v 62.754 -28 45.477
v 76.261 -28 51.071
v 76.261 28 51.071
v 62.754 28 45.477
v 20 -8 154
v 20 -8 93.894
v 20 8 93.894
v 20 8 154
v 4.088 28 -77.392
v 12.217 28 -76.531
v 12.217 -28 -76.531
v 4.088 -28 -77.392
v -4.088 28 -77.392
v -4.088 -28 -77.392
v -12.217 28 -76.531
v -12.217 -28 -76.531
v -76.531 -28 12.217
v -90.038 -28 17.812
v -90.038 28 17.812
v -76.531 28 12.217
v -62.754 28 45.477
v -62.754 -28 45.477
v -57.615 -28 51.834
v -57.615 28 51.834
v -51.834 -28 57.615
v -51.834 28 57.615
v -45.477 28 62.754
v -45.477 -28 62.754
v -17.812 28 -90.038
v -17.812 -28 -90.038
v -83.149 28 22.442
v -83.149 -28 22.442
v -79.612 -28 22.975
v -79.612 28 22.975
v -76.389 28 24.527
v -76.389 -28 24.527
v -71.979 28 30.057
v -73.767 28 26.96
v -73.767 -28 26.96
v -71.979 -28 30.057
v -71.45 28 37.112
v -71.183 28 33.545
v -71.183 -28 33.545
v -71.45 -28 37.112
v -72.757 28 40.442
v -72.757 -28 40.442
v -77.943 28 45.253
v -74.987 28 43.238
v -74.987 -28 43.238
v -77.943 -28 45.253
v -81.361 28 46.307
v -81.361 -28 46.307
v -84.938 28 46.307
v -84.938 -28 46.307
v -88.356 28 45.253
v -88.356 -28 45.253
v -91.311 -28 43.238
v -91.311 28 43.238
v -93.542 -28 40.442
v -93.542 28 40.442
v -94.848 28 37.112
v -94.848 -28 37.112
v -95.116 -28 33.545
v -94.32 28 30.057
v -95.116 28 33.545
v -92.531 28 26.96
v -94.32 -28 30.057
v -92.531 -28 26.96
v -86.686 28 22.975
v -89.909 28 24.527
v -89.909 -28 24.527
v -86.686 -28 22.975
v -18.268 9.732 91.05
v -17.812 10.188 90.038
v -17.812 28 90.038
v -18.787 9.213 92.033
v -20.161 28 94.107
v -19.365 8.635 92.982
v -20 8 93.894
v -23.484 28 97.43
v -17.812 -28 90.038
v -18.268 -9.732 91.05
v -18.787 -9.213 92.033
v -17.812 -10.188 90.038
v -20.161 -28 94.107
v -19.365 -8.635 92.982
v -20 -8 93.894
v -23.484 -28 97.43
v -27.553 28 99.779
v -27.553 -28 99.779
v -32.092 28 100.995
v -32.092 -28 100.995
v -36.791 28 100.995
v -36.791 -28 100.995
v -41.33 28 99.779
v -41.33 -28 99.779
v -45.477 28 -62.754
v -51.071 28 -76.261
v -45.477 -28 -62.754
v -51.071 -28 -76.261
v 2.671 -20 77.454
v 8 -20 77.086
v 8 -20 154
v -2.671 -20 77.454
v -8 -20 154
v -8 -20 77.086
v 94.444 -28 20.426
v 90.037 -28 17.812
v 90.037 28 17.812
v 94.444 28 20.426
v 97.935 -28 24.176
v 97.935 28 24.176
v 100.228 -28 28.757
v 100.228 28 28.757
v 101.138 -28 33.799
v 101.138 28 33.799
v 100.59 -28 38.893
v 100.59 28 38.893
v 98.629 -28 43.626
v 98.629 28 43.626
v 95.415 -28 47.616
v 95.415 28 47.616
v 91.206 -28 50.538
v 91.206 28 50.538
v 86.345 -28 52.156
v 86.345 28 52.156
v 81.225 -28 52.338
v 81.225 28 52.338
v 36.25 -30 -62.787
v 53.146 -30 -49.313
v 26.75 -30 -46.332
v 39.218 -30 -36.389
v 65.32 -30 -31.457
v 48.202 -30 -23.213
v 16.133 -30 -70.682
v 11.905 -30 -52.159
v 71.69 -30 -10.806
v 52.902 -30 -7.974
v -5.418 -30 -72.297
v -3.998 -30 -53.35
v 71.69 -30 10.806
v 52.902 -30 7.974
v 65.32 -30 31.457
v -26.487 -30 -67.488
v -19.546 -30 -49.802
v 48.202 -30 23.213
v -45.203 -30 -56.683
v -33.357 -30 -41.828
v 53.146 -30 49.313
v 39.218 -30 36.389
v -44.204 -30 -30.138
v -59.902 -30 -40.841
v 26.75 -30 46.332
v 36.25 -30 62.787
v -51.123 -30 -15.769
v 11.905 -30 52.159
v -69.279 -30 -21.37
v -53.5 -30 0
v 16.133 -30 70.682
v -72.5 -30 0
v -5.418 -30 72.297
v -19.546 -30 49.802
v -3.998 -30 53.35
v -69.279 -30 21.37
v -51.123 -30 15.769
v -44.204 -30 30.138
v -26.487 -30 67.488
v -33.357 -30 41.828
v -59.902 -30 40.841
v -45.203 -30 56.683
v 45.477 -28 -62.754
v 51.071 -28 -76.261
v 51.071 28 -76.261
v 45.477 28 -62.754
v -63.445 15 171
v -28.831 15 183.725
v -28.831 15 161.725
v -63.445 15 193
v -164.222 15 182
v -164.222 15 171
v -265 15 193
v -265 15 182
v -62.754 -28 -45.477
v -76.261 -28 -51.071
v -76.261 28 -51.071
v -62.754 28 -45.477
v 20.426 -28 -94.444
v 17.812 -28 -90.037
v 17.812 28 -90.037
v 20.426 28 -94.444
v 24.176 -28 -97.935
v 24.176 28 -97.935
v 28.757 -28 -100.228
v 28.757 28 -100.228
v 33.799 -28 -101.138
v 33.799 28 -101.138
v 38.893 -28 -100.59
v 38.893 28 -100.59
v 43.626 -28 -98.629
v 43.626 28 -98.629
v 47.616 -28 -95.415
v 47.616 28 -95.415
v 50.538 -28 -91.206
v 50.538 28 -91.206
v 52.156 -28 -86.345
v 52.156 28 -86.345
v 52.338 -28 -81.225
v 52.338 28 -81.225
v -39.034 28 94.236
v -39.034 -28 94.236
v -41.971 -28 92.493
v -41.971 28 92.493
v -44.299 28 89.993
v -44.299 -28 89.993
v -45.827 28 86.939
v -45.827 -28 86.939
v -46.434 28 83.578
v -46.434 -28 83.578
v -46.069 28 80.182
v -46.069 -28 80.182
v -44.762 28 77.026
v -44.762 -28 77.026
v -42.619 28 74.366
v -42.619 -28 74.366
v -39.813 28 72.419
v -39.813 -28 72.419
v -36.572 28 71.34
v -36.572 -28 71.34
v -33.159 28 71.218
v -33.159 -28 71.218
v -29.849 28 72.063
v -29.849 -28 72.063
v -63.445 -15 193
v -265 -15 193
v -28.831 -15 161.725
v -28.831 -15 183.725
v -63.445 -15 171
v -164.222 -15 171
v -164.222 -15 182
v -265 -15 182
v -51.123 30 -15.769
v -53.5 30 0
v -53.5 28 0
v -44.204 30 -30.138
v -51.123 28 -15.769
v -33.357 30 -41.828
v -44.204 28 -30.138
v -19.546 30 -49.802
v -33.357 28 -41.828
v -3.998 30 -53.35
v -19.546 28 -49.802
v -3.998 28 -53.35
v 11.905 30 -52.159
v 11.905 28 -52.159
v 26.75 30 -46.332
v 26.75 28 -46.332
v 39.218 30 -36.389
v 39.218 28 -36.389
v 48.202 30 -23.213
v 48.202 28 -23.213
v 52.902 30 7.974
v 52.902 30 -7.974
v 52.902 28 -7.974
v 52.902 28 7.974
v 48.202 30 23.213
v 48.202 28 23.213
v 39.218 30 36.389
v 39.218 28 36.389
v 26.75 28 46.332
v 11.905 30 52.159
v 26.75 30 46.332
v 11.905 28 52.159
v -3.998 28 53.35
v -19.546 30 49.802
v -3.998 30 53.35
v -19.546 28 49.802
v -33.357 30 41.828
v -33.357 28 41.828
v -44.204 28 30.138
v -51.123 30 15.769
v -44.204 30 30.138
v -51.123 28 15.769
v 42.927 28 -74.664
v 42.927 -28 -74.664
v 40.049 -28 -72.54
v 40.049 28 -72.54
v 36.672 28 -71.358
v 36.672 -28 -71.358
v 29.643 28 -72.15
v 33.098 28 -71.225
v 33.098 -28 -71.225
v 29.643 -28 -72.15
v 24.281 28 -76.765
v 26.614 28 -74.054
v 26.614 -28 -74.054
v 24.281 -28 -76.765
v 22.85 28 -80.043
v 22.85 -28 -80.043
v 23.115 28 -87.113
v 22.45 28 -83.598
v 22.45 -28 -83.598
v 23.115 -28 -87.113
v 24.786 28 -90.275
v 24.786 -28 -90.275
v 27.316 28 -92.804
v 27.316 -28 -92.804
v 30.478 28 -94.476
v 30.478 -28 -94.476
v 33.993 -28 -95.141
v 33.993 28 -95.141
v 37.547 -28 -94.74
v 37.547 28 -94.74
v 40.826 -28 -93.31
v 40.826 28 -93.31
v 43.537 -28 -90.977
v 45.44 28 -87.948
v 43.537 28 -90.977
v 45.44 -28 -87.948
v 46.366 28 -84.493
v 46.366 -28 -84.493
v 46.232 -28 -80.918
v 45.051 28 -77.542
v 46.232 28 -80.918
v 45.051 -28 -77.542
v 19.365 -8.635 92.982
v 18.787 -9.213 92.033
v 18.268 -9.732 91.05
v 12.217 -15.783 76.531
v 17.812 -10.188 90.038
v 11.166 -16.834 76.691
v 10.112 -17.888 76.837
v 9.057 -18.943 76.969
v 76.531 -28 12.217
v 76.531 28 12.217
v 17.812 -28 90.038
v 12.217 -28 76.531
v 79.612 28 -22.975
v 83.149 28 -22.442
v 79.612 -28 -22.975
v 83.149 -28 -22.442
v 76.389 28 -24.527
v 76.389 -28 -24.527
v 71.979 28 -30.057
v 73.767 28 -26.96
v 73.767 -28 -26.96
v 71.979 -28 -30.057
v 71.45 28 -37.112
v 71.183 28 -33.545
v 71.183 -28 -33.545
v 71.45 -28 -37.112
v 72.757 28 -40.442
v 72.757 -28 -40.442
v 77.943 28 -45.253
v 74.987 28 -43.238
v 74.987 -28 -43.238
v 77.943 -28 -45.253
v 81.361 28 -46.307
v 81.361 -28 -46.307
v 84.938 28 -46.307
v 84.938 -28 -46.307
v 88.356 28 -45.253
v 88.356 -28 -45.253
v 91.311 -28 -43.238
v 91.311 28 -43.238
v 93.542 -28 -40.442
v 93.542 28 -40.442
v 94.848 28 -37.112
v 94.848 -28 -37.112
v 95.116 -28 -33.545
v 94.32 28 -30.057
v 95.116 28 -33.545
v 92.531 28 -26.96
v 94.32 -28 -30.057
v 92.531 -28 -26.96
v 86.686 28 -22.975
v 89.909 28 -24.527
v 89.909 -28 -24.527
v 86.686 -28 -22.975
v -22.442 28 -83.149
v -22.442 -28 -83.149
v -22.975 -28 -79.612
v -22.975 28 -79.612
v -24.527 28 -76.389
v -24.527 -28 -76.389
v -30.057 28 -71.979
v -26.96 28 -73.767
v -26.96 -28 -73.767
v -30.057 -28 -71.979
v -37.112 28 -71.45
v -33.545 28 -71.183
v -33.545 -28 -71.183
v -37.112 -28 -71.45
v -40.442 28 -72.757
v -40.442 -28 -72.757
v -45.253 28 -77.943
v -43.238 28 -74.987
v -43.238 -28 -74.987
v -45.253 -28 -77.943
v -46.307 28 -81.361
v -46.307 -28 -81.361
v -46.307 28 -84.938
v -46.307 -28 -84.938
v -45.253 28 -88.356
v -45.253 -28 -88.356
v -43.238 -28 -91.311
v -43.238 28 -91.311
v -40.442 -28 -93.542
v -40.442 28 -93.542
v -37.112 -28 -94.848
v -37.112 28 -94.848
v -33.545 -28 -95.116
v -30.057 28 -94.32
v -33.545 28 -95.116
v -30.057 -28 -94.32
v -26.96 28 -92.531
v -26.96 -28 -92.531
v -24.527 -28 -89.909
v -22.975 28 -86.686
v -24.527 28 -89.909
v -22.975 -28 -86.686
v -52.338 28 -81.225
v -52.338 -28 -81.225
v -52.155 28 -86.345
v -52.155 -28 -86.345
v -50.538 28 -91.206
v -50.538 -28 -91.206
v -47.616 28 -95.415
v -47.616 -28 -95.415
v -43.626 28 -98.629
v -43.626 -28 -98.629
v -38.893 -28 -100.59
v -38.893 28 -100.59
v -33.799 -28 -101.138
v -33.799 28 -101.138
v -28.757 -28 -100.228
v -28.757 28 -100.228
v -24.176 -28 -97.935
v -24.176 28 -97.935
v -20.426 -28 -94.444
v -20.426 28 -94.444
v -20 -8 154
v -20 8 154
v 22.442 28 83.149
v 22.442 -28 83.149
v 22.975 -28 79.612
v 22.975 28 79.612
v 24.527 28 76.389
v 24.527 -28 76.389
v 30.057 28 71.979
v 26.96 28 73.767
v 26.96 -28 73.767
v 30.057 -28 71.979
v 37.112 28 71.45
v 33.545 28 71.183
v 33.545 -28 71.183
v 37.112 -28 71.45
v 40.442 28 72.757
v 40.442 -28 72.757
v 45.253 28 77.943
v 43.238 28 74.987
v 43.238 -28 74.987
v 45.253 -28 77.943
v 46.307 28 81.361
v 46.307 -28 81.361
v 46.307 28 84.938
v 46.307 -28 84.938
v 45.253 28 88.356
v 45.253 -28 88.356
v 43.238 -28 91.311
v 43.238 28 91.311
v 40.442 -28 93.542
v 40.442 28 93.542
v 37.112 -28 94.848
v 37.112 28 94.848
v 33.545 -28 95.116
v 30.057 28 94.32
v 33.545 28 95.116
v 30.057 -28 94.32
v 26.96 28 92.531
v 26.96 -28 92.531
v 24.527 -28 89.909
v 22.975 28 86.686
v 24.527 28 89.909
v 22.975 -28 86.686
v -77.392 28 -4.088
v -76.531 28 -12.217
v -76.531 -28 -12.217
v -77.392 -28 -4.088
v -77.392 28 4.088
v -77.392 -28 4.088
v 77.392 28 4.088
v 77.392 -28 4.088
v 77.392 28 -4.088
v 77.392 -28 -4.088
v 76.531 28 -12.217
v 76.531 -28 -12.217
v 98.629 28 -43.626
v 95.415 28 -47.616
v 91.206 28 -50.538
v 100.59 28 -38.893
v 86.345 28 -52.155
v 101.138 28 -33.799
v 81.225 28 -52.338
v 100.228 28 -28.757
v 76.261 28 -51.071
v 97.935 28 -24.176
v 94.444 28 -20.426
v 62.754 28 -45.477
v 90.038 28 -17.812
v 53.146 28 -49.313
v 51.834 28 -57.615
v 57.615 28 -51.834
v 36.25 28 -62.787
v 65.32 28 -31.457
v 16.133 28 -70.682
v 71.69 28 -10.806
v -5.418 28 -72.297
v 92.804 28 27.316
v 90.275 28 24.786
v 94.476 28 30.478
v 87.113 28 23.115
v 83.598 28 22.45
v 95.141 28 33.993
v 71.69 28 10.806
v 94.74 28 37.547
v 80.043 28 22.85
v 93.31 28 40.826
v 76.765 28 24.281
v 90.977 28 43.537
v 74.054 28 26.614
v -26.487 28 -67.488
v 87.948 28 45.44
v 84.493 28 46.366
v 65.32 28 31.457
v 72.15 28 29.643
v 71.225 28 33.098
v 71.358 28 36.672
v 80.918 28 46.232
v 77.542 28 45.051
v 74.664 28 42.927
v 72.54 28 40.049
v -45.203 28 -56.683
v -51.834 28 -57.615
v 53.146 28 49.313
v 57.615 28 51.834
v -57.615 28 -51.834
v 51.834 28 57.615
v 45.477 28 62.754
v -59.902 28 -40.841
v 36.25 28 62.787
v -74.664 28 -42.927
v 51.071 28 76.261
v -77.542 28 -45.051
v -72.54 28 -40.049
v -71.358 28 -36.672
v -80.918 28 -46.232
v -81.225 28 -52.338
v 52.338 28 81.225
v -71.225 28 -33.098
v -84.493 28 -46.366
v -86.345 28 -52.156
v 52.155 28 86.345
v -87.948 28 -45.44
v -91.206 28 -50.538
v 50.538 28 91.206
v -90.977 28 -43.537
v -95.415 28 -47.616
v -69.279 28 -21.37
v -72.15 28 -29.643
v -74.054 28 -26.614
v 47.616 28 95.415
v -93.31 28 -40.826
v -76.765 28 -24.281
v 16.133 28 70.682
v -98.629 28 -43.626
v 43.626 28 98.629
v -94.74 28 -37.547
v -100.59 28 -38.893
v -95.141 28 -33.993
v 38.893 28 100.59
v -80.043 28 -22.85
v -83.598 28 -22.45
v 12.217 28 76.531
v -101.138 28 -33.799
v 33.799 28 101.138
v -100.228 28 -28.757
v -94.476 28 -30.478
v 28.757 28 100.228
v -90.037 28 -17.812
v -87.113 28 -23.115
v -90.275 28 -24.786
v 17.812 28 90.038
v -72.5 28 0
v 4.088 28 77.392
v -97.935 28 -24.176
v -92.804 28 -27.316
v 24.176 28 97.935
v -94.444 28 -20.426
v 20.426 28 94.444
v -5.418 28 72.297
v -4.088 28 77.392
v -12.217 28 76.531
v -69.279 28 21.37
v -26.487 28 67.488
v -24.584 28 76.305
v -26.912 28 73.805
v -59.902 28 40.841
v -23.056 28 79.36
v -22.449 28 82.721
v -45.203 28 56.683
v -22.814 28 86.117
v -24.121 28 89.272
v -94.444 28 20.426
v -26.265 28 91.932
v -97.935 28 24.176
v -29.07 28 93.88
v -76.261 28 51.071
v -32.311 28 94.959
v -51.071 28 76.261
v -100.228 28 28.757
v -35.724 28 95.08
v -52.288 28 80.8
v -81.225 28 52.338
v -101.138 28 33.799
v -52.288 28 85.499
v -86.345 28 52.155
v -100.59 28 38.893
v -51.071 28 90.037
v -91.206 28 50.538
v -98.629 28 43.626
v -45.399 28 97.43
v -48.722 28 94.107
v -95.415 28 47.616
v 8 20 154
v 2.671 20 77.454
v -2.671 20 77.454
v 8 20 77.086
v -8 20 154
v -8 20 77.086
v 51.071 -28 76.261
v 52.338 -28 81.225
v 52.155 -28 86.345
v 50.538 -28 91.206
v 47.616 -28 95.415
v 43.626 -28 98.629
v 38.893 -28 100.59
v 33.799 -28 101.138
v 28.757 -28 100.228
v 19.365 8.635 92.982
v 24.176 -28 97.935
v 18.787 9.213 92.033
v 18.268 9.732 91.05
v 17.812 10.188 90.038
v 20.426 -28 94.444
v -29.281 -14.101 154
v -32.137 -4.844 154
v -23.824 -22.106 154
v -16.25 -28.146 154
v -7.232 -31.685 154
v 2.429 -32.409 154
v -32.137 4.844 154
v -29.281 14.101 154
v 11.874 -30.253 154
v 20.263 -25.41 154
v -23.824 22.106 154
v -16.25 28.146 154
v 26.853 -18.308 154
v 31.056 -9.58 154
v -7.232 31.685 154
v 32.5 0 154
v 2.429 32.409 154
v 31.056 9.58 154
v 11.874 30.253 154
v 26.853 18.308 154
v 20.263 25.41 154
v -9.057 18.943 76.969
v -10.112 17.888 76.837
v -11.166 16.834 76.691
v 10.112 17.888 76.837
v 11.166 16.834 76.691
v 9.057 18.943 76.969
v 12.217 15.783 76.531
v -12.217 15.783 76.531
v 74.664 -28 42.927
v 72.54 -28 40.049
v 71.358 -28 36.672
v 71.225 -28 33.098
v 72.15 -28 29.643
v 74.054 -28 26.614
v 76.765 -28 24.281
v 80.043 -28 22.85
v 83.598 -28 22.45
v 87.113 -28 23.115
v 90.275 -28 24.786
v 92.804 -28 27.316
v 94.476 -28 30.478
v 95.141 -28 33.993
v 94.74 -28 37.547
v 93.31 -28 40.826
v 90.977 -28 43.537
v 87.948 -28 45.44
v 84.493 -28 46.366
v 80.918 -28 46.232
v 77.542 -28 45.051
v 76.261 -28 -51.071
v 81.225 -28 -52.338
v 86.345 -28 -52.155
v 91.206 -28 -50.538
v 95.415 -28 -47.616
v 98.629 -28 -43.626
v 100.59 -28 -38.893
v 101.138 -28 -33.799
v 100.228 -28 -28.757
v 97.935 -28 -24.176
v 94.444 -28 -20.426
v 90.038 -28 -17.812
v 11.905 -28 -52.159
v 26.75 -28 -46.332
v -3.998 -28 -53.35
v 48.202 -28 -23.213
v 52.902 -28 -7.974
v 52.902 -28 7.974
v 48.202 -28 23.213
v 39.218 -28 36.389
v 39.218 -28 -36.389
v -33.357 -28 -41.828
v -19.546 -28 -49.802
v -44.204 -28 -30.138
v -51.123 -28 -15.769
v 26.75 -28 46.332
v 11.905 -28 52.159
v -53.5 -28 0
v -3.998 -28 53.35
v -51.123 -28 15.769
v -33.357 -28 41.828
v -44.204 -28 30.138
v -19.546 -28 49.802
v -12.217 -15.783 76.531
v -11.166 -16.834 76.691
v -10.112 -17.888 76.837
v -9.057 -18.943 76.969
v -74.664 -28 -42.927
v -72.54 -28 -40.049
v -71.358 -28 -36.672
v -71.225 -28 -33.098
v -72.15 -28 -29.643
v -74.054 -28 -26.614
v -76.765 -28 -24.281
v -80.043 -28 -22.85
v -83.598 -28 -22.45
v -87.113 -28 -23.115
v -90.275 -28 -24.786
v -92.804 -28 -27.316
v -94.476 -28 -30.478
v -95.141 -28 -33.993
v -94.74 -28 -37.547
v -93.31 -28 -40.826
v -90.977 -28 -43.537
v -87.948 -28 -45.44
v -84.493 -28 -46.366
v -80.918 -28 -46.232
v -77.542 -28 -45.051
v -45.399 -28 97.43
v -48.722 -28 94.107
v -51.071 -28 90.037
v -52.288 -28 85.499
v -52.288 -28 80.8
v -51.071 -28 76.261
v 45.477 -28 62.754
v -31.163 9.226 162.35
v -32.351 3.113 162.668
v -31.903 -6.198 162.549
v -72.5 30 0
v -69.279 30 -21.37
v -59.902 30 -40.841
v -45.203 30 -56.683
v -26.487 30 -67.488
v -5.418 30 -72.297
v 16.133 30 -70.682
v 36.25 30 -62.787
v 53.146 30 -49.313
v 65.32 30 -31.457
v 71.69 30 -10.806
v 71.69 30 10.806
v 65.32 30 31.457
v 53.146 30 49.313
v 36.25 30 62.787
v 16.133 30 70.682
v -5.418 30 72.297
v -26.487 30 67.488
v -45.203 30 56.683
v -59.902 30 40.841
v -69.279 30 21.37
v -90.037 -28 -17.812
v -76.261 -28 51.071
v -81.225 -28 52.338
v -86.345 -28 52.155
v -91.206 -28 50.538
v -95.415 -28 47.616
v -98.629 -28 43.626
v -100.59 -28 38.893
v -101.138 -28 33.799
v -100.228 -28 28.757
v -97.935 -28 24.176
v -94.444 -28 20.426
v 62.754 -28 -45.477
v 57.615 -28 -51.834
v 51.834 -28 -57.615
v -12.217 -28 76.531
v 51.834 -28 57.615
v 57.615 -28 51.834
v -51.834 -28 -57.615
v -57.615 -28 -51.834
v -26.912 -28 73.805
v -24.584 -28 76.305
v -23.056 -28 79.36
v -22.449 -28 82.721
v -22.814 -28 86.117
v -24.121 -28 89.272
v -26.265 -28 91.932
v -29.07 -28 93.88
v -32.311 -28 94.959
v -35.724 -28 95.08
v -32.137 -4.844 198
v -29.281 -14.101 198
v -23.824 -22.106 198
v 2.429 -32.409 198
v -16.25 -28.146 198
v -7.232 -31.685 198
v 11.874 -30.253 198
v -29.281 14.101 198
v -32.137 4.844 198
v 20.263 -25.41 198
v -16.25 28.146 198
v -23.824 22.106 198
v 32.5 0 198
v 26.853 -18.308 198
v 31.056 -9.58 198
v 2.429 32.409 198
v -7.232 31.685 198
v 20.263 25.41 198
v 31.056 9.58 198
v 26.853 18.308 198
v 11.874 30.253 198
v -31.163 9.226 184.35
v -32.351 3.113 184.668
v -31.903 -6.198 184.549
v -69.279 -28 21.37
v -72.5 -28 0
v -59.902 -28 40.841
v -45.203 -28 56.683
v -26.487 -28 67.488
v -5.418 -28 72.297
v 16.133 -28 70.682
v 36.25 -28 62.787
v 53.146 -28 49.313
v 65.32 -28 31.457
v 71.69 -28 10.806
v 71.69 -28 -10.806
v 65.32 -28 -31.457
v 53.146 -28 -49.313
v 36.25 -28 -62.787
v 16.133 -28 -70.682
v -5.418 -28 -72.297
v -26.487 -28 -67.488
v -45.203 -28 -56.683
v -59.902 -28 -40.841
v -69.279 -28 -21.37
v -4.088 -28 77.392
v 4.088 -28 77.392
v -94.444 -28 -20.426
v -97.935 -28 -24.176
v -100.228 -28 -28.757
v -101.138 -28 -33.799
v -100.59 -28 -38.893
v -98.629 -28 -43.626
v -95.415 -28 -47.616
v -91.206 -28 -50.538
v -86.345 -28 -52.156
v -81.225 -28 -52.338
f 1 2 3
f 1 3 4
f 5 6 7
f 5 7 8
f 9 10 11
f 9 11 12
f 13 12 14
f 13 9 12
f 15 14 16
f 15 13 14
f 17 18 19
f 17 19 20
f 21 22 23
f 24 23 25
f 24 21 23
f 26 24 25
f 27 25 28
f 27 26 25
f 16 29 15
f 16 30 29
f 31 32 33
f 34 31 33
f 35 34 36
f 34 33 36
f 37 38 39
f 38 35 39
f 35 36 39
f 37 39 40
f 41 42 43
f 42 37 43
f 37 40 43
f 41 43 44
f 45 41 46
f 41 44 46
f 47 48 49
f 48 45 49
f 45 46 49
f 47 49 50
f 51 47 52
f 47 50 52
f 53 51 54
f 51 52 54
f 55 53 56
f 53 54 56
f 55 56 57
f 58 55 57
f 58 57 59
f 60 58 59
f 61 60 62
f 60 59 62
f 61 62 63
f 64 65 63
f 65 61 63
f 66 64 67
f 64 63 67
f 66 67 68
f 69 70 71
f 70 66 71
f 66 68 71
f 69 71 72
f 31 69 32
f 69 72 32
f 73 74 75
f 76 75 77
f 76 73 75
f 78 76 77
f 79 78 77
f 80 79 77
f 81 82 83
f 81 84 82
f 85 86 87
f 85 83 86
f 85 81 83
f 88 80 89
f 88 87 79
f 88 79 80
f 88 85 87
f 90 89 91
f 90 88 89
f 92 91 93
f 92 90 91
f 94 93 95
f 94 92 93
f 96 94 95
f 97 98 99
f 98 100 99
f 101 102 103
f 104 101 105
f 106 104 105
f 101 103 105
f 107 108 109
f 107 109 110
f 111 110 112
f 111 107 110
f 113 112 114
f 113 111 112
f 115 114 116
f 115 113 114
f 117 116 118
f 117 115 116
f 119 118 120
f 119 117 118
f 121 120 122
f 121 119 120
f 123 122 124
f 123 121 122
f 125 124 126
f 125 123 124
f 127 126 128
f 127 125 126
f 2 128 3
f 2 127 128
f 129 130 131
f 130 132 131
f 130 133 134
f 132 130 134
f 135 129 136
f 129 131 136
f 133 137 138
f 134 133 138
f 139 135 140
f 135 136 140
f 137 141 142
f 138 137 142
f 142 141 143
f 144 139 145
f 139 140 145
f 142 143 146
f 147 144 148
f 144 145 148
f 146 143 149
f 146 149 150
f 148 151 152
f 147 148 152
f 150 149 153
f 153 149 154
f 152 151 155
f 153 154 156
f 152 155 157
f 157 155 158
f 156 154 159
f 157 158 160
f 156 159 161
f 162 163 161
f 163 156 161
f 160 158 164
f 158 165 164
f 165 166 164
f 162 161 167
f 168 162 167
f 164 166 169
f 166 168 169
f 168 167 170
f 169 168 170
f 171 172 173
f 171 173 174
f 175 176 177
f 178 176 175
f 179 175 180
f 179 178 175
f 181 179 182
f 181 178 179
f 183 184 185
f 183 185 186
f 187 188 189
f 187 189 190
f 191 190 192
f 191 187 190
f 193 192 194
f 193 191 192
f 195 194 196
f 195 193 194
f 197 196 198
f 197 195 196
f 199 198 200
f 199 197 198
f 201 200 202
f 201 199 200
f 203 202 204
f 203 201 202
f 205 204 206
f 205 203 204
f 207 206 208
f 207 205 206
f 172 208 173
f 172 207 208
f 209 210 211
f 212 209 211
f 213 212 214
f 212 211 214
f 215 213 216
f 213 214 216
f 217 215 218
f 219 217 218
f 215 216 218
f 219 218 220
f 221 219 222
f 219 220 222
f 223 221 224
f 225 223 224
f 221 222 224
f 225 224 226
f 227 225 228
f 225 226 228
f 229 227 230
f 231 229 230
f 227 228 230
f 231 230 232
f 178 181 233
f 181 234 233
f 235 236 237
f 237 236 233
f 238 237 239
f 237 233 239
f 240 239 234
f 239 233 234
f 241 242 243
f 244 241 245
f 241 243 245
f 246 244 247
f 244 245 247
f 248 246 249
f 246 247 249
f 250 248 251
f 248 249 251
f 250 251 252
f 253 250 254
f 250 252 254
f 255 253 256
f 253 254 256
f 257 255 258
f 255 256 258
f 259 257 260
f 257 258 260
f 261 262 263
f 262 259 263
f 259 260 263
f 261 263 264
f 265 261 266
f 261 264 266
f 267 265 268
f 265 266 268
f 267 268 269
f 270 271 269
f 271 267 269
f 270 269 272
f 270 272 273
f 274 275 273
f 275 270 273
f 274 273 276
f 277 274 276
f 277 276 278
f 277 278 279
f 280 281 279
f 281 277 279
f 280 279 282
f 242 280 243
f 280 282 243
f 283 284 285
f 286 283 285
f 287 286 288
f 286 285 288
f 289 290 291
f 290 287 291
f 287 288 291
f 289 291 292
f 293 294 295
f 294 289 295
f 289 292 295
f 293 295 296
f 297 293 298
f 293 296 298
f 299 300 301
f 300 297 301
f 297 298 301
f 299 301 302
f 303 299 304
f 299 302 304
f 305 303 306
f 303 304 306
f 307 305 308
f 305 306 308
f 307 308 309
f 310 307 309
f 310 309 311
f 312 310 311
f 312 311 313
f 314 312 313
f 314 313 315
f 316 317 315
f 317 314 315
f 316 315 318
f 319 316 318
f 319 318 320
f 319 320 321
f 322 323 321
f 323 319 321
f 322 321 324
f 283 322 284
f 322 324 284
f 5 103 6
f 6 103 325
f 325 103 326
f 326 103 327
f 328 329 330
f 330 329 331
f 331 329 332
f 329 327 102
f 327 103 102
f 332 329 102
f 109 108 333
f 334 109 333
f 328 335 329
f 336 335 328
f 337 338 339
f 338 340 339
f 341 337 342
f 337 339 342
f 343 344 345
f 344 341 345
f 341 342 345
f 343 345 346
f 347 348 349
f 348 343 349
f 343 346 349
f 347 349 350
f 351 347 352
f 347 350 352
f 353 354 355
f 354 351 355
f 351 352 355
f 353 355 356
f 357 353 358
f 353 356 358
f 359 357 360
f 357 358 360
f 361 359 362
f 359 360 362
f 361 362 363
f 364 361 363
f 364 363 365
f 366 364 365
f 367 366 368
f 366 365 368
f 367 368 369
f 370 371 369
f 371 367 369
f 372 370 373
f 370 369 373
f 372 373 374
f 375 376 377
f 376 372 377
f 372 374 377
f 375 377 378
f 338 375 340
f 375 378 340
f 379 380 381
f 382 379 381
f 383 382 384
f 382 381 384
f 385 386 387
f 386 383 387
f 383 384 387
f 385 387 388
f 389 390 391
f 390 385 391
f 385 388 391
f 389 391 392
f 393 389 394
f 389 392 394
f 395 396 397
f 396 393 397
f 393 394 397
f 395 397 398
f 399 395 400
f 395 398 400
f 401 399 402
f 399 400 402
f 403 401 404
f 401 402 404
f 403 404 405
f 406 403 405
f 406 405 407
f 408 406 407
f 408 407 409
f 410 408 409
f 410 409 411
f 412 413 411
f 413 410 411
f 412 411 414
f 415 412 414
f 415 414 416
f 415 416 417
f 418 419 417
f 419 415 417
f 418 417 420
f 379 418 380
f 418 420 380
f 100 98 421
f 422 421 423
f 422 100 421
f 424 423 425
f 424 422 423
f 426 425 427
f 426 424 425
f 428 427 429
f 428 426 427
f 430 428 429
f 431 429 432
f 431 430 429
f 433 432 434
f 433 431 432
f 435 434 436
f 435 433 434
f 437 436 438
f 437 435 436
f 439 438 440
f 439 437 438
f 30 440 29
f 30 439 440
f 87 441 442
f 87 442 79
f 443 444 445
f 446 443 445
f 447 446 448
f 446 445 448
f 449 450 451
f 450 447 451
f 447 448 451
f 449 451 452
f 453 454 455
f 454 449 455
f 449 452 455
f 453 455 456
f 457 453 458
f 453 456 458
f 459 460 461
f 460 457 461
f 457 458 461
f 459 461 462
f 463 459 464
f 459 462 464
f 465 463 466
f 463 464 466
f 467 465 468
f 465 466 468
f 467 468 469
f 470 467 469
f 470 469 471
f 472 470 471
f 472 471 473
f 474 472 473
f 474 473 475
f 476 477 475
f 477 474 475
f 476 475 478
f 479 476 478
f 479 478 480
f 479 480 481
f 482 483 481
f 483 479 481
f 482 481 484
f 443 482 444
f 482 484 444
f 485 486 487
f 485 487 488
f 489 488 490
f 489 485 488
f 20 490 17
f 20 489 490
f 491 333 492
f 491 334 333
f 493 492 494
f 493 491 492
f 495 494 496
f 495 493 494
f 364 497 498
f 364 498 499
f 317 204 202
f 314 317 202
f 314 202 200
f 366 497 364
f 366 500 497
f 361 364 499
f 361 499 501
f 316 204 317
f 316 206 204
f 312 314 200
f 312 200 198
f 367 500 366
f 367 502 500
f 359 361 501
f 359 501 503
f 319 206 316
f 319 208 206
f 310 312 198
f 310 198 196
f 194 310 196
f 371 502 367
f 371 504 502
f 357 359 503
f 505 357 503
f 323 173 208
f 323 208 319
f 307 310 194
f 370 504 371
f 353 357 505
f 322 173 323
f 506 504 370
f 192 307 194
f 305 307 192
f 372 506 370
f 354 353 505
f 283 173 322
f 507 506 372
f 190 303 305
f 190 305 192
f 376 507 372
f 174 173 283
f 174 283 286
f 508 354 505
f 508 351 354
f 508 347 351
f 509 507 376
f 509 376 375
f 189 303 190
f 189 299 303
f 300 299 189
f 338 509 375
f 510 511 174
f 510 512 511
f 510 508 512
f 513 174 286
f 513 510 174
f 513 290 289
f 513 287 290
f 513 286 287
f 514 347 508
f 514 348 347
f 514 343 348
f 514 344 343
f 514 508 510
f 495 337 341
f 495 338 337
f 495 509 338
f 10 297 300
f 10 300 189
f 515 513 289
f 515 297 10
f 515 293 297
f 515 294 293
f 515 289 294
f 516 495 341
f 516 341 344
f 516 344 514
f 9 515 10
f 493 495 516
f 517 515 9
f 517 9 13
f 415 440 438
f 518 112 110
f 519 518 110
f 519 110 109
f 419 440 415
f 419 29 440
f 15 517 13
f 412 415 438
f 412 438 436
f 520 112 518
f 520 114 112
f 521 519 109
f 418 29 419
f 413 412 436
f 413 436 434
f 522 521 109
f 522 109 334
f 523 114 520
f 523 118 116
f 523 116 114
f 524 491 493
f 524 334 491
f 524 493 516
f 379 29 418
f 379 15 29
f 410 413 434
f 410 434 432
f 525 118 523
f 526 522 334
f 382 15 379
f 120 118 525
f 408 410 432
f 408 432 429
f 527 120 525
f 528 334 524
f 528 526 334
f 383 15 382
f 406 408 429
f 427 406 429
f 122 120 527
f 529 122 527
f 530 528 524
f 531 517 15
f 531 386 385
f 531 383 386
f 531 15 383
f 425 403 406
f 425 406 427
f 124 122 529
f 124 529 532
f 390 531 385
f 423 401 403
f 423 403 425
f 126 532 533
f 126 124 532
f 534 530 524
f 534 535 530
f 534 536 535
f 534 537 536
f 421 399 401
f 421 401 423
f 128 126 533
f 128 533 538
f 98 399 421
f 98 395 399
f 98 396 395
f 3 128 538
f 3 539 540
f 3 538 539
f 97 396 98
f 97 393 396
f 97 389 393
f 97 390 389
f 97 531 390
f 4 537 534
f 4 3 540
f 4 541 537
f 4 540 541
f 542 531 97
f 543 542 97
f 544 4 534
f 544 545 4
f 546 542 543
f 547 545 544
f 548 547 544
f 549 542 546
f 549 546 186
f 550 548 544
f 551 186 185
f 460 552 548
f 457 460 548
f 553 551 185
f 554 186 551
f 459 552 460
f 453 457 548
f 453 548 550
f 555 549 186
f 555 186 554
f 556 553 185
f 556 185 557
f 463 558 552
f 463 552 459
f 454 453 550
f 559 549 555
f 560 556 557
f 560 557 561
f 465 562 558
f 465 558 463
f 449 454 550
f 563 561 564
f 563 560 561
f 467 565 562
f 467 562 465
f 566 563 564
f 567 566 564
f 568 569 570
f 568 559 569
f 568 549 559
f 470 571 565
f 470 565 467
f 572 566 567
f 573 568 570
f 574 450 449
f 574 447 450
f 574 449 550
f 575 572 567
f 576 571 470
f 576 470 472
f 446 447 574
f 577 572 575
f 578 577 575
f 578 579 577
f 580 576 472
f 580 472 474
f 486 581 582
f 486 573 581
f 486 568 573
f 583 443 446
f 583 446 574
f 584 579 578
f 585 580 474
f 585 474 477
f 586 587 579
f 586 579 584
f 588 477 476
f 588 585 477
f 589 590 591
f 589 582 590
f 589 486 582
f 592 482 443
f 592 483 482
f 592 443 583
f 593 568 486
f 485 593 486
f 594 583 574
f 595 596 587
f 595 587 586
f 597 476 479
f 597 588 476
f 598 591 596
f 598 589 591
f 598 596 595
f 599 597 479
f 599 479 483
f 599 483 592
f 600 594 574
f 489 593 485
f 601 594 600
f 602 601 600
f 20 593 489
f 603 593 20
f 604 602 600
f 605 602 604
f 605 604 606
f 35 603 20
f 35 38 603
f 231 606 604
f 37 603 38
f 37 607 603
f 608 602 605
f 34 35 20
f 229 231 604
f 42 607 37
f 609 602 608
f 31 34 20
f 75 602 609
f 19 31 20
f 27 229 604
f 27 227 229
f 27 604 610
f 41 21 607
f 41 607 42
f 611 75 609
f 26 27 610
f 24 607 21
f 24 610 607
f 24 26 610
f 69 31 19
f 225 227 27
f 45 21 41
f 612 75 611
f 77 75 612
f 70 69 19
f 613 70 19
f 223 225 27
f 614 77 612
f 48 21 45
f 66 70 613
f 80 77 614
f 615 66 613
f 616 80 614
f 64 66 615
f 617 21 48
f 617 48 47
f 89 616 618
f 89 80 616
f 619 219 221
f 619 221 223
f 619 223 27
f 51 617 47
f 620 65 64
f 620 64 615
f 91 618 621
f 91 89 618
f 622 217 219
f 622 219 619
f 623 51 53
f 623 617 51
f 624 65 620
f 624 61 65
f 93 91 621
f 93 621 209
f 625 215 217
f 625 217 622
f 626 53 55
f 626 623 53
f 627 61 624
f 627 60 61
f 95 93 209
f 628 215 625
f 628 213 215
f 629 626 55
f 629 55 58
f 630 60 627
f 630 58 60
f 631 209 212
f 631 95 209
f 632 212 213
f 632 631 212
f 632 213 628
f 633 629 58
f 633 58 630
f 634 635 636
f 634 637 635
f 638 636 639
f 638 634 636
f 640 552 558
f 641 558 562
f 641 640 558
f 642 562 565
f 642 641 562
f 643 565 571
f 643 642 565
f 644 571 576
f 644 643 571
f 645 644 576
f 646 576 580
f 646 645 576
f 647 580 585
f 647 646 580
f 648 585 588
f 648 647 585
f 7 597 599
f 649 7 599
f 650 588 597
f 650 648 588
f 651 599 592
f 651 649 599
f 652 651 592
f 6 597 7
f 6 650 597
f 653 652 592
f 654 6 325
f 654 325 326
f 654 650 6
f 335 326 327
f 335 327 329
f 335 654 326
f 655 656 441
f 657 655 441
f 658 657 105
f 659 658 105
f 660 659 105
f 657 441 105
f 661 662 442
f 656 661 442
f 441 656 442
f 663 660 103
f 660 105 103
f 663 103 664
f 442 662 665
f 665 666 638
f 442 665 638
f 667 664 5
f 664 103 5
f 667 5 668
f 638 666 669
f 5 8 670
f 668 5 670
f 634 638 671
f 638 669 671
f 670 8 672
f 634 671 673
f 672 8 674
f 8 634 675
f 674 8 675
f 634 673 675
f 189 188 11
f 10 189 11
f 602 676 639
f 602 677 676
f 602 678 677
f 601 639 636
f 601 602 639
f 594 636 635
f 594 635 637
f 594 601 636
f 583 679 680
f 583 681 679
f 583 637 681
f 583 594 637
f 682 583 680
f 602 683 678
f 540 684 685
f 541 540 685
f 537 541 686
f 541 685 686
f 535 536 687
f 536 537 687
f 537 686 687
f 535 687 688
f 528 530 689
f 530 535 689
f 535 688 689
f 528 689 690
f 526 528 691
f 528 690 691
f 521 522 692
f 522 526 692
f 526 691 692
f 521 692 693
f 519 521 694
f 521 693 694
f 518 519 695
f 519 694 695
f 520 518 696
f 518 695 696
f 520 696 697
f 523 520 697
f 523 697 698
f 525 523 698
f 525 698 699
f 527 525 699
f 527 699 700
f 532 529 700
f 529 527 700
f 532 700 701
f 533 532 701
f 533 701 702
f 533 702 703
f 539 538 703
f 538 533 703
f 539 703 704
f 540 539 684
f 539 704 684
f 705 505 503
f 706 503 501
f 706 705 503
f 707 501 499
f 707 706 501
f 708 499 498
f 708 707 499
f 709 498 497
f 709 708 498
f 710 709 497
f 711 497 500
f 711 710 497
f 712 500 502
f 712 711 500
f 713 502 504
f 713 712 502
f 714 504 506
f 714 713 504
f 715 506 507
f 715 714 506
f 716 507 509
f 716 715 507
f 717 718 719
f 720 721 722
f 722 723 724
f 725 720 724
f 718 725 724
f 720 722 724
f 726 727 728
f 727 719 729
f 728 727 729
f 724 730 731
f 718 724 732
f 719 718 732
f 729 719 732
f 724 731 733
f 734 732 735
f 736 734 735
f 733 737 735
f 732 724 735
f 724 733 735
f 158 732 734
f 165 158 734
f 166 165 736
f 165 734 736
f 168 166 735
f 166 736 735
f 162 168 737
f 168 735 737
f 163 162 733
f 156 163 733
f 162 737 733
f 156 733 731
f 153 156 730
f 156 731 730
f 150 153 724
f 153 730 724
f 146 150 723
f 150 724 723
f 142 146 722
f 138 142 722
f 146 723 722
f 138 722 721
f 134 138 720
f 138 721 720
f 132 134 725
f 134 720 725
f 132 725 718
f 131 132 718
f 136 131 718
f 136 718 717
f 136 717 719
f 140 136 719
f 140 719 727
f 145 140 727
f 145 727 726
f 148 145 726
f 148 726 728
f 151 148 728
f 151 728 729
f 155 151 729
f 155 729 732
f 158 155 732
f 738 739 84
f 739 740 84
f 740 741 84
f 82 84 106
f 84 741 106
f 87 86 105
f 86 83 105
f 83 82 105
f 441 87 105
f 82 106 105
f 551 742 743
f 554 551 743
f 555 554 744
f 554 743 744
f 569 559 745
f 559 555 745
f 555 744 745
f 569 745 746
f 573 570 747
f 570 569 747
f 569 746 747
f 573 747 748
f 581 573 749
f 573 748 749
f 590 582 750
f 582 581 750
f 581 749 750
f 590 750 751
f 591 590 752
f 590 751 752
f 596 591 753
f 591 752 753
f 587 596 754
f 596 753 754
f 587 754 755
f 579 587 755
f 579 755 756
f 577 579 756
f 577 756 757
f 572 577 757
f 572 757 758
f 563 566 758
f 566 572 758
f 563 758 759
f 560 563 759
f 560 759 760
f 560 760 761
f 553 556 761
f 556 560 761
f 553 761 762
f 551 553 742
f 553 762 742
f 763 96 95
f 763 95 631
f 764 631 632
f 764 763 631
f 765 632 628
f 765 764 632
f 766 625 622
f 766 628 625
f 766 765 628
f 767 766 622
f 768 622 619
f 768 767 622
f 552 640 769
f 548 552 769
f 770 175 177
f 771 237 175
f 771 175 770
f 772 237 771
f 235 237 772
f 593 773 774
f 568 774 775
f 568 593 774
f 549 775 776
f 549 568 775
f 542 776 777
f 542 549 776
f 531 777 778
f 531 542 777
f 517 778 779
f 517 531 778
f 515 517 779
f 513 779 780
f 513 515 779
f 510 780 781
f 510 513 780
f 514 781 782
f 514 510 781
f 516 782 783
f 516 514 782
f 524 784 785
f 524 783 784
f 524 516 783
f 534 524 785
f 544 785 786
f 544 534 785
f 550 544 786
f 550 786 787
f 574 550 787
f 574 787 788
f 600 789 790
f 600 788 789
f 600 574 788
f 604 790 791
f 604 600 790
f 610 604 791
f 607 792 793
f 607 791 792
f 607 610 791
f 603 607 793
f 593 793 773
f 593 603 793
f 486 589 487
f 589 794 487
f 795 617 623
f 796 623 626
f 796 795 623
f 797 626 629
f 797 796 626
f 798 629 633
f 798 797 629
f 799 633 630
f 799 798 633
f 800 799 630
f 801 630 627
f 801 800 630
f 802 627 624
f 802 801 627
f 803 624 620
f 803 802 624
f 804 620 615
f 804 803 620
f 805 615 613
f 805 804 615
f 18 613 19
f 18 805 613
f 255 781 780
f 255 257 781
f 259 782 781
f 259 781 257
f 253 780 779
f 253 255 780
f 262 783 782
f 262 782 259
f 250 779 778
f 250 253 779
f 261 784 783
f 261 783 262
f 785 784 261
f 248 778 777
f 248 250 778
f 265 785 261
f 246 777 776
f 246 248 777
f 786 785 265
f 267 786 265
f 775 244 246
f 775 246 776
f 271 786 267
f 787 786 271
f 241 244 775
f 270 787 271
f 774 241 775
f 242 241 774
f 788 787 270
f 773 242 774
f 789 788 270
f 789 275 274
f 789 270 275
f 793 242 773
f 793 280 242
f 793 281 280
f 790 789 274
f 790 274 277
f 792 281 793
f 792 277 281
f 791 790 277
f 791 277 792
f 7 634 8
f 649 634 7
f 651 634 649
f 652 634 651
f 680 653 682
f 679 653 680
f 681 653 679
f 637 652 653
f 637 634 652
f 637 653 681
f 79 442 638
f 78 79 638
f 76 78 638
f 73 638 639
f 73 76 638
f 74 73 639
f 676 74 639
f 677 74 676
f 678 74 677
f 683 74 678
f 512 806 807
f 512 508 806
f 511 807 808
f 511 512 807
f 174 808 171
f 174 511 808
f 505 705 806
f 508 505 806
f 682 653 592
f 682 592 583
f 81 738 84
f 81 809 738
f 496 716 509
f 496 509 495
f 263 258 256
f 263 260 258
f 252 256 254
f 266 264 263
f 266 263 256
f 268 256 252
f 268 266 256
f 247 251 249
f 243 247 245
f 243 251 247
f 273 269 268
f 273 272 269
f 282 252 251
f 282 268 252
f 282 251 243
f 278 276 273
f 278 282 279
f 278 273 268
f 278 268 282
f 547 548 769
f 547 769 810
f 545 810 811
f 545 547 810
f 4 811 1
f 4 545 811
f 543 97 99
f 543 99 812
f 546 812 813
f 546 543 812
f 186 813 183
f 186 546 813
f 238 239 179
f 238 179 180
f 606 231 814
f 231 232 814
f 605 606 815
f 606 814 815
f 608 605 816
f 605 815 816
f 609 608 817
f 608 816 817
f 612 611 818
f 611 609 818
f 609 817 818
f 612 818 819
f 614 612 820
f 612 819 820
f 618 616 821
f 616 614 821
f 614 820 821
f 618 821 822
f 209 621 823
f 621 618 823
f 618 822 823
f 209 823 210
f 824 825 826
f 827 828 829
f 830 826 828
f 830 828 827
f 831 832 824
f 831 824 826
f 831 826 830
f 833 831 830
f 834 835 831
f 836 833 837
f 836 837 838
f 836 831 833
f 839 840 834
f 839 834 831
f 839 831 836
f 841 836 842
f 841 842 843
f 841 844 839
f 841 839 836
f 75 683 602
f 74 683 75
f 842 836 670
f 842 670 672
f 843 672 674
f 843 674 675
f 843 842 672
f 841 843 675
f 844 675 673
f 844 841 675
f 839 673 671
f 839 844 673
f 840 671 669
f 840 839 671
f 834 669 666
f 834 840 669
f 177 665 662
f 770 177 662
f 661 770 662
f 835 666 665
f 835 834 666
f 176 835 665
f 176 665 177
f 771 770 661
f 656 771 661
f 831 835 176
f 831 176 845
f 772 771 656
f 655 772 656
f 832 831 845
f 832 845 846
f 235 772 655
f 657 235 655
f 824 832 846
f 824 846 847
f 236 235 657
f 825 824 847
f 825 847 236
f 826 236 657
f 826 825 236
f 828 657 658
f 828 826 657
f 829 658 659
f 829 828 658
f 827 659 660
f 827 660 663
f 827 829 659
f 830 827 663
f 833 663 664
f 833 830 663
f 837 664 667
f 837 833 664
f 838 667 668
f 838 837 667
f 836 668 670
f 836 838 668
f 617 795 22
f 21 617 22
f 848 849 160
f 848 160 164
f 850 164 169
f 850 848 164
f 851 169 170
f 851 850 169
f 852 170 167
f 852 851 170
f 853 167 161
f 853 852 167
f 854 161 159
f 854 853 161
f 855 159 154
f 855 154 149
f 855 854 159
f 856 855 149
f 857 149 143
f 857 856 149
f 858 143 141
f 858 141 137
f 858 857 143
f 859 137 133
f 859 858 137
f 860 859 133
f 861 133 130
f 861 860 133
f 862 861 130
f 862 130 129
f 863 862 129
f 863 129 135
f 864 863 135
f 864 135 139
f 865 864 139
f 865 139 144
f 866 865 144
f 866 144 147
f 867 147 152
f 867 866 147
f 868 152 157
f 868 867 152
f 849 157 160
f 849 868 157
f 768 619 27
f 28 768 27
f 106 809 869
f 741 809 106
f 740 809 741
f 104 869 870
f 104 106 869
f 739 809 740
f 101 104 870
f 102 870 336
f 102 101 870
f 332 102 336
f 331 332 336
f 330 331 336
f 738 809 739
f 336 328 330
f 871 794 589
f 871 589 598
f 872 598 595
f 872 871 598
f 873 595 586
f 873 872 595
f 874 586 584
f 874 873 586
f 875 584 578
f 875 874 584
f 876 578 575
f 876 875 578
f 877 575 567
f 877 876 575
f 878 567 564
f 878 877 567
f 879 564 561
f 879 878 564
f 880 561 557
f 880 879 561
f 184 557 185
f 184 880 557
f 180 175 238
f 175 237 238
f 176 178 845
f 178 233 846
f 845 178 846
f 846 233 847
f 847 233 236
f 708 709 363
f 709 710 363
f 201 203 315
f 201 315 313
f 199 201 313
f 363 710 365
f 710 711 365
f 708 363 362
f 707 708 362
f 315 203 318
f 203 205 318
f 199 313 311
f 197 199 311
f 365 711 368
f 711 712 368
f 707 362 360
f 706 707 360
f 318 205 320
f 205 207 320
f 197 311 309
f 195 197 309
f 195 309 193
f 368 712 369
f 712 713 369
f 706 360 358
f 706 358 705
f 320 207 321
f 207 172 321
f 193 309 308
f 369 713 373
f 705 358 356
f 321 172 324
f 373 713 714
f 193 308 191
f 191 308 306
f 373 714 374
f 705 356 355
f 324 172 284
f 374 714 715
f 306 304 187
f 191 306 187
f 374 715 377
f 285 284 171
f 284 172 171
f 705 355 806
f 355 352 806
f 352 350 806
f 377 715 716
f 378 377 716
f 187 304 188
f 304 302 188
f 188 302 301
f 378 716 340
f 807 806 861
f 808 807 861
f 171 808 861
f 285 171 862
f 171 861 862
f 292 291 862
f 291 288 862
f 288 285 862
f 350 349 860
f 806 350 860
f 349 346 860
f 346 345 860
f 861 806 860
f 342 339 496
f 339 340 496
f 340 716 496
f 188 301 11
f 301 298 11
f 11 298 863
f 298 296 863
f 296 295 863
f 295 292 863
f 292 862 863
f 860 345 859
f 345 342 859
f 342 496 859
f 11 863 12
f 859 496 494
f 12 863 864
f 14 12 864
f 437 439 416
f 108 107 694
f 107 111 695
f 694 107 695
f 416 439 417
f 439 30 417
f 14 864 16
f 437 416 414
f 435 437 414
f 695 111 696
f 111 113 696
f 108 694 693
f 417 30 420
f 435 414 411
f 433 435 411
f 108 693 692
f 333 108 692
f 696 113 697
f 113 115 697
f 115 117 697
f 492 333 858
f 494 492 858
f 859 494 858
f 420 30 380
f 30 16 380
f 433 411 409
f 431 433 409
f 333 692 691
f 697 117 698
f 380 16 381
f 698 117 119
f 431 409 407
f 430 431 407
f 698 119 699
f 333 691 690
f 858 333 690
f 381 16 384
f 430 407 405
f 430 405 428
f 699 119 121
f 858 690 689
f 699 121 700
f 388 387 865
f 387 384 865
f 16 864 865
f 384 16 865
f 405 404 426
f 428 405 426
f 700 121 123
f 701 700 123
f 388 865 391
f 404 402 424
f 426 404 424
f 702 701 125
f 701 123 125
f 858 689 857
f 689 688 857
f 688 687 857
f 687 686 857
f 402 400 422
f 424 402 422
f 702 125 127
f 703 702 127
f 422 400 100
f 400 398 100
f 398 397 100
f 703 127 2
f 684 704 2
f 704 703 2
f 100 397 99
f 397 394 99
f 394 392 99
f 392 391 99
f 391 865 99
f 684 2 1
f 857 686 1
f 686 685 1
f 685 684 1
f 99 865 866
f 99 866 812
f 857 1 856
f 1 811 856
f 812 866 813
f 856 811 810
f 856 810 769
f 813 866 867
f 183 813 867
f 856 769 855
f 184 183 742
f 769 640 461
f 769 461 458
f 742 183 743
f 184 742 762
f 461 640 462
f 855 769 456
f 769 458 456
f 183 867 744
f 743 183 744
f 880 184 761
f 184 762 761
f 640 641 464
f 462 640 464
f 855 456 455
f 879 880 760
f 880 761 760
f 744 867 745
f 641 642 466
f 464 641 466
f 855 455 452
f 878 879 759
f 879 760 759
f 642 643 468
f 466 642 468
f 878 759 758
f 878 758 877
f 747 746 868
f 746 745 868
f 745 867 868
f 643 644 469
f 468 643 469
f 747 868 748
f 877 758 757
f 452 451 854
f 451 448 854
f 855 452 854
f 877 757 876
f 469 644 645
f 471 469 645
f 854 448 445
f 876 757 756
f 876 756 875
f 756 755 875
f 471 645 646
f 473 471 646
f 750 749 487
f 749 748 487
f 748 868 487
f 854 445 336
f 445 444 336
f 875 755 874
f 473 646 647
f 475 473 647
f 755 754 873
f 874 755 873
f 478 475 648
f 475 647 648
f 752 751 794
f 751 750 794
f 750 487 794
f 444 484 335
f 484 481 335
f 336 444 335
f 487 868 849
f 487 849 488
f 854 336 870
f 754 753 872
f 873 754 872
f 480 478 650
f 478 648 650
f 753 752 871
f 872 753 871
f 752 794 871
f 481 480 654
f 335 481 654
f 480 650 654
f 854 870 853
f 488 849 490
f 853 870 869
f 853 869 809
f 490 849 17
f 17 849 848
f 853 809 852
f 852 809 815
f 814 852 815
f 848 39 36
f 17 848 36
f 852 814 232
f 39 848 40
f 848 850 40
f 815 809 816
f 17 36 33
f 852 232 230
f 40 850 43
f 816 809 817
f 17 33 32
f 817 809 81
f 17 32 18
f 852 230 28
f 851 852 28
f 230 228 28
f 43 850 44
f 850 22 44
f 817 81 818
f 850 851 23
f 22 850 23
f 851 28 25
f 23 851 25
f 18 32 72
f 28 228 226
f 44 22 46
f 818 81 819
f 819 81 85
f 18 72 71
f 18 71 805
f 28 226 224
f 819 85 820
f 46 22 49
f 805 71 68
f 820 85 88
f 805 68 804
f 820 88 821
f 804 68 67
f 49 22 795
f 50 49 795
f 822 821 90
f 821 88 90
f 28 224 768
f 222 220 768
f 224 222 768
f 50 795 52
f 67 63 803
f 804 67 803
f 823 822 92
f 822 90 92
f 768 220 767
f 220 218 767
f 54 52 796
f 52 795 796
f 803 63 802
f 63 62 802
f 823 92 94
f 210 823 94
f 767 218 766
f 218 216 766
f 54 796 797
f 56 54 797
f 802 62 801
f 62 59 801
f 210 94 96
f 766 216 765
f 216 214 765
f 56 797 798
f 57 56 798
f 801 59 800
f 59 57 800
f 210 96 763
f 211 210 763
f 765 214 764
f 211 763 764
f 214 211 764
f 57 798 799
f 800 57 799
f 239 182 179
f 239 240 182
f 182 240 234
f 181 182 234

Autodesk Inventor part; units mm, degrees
ref_plane "YZ Plane" through (0, 0, 0) normal (1, 0, 0) x (0, 1, 0)
ref_plane "XZ Plane" through (0, 0, 0) normal (0, 1, 0) x (-1, 0, 0)
ref_plane "XY Plane" through (0, 0, 0) normal (0, 0, 1) x (1, 0, 0)
sketch "Sketch1" plane through (0, 0, 0) normal (0, 1, 0) x (-1, 0, 0)
  circle A0 centre (0, 0) radius 72.5
  circle A1 centre (0, 0) radius 77.5
  circle A2 centre (0, 0) radius 53.5
  circle A3 centre (0, 0) radius 90 construction
  line L0 (0, 0) -> (-34.4415, 83.1492) construction
  circle A4 centre (-34.4415, 83.1492) radius 12
  line L1 (0, 154) -> (-32.5, 154)
  line L2 (-32.5, 154) -> (-32.5, 198)
  line L3 (-32.5, 198) -> (0, 198)
  line L4 (0, 198) -> (0, 154)
  line L5 (0, 140.825) -> (0, 198)
  line L6 (20, 74.8749) -> (-20, 74.8749)
  line L7 (-20, 74.8749) -> (-20, 154)
  line L8 (-20, 154) -> (20, 154)
  line L9 (20, 154) -> (20, 74.8749)
  line L10 (0, 0) -> (0, 198)
  line L11 (265, 193) -> (63.4449, 193)
  line L12 (63.4449, 193) -> (63.4449, 171)
  line L13 (63.4449, 171) -> (265, 171)
  line L14 (265, 171) -> (265, 193)
  line L15 (63.4449, 193) -> (0, 176)
  line L16 (63.4449, 171) -> (0, 154)
  line L17 (0, 154) -> (0, 176)
  arc A5 (-17.8117, 90.0375) -> (-51.0713, 76.2609) centre (-34.4415, 83.1492) ccw
  line L18 (-51.0713, 76.2609) -> (-45.4768, 62.7544)
  line L19 (-20, 74.8749) -> (-20, 106.132)
  line L20 (3.012, 3.8335) -> (-33.2222, -83.6438) construction
  line L21 (265, 182) -> (164.2224, 182)
  line L22 (164.2224, 182) -> (164.2224, 171)
  line L23 (164.2224, 171) -> (265, 171)
  line L24 (265, 171) -> (265, 182)
  line L25 (-17.8117, 90.0375) -> (-12.2171, 76.531)
  line L26 (-45.4768, 62.7544) -> (-12.2171, 76.531)
  point P0 (-41.2493, -65.6106)
  point P1 (-7.6728, -77.1192)
  dimension "oDiaGasket" = 145
  dimension "oDiaOutside" = 155
  dimension "oDiaInside" = 107
  dimension "oHoledia" = 24
  dimension "oStemThick" = 40
  dimension "oAngleFirstBolt" = 22.5
  dimension "oKcircle" = 180
  dimension "oDiaTop" = 65
  dimension "oHeightTop" = 44
  dimension "oHandleLenght" = 265
  dimension "d10" = 5
  dimension "d11" = 15
  dimension "d13" = 6
  dimension "oCenterTop" = 198
  dimension "d32" = 22.5
sketch "Sketch2" plane through (0, 0, 0) normal (0, 1, 0) x (-1, 0, 0)
  circle A0 centre (0, 0) radius 77.5
  circle A1 centre (0, 0) radius 53.5
  circle A2 centre (0, 0) radius 72.5
  circle A3 centre (0, 0) radius 53.5 projected
  circle A4 centre (0, 0) radius 72.5 projected
  circle A5 centre (0, 0) radius 77.5 projected
extrude "Extrusion4" add sketch "Sketch2" along normal mid plane 56 contours A0 | A2
extrude "Extrusion5" add sketch "Sketch2" along normal mid plane 60 contours A2
extrude "Extrusion8" add sketch "Sketch1" along normal mid plane 56 contours A2 | L26 A1 L6 | L6 A1 L26 | L7 A5 L25 A1 | A1 L18 A5 L7 picked at (-33.064, 68.4842) picked at (-14.4207, 75.8246)
pattern_circular "Circular Pattern2" count 8 over 360 about axis through (0, 0, 0) along (0, 1, 0) of "Extrusion8"
extrude "Extrusion6" add sketch "Sketch1" along normal mid plane 40 contours A1 L10 L5 L8 L9 | A1 L25 A5 L7 L1 L5 L10 | L7 A5 L25 A1
revolve "Revolution1" add sketch "Sketch1" angle 360 about axis through (0, 0, 0) along (0, 0, 1) contours L1 L2 L3 L4
mirror "Mirror1" about plane through (0, 0, 0) normal (1, 0, 0) of "Extrusion8"
extrude "Extrusion9" add sketch "Sketch1" along normal mid plane 30 contours L4 L15 L12 L16 | L12 L11 L14 L21 L22 L13
chamfer "Chamfer1" distance 12 angle 45 4 edges at (-20, 20, 123.9468) (20, 20, 123.9468) (-20, -20, 123.9468) (20, -20, 123.9468)
equation "\"d32\" = oAngleFirstBolt"
equation "\"d25\" = oStemThick"
properties part number "BUTTERFLY VALVE MANUAL LUG TYPE DN100" material "GG25"
